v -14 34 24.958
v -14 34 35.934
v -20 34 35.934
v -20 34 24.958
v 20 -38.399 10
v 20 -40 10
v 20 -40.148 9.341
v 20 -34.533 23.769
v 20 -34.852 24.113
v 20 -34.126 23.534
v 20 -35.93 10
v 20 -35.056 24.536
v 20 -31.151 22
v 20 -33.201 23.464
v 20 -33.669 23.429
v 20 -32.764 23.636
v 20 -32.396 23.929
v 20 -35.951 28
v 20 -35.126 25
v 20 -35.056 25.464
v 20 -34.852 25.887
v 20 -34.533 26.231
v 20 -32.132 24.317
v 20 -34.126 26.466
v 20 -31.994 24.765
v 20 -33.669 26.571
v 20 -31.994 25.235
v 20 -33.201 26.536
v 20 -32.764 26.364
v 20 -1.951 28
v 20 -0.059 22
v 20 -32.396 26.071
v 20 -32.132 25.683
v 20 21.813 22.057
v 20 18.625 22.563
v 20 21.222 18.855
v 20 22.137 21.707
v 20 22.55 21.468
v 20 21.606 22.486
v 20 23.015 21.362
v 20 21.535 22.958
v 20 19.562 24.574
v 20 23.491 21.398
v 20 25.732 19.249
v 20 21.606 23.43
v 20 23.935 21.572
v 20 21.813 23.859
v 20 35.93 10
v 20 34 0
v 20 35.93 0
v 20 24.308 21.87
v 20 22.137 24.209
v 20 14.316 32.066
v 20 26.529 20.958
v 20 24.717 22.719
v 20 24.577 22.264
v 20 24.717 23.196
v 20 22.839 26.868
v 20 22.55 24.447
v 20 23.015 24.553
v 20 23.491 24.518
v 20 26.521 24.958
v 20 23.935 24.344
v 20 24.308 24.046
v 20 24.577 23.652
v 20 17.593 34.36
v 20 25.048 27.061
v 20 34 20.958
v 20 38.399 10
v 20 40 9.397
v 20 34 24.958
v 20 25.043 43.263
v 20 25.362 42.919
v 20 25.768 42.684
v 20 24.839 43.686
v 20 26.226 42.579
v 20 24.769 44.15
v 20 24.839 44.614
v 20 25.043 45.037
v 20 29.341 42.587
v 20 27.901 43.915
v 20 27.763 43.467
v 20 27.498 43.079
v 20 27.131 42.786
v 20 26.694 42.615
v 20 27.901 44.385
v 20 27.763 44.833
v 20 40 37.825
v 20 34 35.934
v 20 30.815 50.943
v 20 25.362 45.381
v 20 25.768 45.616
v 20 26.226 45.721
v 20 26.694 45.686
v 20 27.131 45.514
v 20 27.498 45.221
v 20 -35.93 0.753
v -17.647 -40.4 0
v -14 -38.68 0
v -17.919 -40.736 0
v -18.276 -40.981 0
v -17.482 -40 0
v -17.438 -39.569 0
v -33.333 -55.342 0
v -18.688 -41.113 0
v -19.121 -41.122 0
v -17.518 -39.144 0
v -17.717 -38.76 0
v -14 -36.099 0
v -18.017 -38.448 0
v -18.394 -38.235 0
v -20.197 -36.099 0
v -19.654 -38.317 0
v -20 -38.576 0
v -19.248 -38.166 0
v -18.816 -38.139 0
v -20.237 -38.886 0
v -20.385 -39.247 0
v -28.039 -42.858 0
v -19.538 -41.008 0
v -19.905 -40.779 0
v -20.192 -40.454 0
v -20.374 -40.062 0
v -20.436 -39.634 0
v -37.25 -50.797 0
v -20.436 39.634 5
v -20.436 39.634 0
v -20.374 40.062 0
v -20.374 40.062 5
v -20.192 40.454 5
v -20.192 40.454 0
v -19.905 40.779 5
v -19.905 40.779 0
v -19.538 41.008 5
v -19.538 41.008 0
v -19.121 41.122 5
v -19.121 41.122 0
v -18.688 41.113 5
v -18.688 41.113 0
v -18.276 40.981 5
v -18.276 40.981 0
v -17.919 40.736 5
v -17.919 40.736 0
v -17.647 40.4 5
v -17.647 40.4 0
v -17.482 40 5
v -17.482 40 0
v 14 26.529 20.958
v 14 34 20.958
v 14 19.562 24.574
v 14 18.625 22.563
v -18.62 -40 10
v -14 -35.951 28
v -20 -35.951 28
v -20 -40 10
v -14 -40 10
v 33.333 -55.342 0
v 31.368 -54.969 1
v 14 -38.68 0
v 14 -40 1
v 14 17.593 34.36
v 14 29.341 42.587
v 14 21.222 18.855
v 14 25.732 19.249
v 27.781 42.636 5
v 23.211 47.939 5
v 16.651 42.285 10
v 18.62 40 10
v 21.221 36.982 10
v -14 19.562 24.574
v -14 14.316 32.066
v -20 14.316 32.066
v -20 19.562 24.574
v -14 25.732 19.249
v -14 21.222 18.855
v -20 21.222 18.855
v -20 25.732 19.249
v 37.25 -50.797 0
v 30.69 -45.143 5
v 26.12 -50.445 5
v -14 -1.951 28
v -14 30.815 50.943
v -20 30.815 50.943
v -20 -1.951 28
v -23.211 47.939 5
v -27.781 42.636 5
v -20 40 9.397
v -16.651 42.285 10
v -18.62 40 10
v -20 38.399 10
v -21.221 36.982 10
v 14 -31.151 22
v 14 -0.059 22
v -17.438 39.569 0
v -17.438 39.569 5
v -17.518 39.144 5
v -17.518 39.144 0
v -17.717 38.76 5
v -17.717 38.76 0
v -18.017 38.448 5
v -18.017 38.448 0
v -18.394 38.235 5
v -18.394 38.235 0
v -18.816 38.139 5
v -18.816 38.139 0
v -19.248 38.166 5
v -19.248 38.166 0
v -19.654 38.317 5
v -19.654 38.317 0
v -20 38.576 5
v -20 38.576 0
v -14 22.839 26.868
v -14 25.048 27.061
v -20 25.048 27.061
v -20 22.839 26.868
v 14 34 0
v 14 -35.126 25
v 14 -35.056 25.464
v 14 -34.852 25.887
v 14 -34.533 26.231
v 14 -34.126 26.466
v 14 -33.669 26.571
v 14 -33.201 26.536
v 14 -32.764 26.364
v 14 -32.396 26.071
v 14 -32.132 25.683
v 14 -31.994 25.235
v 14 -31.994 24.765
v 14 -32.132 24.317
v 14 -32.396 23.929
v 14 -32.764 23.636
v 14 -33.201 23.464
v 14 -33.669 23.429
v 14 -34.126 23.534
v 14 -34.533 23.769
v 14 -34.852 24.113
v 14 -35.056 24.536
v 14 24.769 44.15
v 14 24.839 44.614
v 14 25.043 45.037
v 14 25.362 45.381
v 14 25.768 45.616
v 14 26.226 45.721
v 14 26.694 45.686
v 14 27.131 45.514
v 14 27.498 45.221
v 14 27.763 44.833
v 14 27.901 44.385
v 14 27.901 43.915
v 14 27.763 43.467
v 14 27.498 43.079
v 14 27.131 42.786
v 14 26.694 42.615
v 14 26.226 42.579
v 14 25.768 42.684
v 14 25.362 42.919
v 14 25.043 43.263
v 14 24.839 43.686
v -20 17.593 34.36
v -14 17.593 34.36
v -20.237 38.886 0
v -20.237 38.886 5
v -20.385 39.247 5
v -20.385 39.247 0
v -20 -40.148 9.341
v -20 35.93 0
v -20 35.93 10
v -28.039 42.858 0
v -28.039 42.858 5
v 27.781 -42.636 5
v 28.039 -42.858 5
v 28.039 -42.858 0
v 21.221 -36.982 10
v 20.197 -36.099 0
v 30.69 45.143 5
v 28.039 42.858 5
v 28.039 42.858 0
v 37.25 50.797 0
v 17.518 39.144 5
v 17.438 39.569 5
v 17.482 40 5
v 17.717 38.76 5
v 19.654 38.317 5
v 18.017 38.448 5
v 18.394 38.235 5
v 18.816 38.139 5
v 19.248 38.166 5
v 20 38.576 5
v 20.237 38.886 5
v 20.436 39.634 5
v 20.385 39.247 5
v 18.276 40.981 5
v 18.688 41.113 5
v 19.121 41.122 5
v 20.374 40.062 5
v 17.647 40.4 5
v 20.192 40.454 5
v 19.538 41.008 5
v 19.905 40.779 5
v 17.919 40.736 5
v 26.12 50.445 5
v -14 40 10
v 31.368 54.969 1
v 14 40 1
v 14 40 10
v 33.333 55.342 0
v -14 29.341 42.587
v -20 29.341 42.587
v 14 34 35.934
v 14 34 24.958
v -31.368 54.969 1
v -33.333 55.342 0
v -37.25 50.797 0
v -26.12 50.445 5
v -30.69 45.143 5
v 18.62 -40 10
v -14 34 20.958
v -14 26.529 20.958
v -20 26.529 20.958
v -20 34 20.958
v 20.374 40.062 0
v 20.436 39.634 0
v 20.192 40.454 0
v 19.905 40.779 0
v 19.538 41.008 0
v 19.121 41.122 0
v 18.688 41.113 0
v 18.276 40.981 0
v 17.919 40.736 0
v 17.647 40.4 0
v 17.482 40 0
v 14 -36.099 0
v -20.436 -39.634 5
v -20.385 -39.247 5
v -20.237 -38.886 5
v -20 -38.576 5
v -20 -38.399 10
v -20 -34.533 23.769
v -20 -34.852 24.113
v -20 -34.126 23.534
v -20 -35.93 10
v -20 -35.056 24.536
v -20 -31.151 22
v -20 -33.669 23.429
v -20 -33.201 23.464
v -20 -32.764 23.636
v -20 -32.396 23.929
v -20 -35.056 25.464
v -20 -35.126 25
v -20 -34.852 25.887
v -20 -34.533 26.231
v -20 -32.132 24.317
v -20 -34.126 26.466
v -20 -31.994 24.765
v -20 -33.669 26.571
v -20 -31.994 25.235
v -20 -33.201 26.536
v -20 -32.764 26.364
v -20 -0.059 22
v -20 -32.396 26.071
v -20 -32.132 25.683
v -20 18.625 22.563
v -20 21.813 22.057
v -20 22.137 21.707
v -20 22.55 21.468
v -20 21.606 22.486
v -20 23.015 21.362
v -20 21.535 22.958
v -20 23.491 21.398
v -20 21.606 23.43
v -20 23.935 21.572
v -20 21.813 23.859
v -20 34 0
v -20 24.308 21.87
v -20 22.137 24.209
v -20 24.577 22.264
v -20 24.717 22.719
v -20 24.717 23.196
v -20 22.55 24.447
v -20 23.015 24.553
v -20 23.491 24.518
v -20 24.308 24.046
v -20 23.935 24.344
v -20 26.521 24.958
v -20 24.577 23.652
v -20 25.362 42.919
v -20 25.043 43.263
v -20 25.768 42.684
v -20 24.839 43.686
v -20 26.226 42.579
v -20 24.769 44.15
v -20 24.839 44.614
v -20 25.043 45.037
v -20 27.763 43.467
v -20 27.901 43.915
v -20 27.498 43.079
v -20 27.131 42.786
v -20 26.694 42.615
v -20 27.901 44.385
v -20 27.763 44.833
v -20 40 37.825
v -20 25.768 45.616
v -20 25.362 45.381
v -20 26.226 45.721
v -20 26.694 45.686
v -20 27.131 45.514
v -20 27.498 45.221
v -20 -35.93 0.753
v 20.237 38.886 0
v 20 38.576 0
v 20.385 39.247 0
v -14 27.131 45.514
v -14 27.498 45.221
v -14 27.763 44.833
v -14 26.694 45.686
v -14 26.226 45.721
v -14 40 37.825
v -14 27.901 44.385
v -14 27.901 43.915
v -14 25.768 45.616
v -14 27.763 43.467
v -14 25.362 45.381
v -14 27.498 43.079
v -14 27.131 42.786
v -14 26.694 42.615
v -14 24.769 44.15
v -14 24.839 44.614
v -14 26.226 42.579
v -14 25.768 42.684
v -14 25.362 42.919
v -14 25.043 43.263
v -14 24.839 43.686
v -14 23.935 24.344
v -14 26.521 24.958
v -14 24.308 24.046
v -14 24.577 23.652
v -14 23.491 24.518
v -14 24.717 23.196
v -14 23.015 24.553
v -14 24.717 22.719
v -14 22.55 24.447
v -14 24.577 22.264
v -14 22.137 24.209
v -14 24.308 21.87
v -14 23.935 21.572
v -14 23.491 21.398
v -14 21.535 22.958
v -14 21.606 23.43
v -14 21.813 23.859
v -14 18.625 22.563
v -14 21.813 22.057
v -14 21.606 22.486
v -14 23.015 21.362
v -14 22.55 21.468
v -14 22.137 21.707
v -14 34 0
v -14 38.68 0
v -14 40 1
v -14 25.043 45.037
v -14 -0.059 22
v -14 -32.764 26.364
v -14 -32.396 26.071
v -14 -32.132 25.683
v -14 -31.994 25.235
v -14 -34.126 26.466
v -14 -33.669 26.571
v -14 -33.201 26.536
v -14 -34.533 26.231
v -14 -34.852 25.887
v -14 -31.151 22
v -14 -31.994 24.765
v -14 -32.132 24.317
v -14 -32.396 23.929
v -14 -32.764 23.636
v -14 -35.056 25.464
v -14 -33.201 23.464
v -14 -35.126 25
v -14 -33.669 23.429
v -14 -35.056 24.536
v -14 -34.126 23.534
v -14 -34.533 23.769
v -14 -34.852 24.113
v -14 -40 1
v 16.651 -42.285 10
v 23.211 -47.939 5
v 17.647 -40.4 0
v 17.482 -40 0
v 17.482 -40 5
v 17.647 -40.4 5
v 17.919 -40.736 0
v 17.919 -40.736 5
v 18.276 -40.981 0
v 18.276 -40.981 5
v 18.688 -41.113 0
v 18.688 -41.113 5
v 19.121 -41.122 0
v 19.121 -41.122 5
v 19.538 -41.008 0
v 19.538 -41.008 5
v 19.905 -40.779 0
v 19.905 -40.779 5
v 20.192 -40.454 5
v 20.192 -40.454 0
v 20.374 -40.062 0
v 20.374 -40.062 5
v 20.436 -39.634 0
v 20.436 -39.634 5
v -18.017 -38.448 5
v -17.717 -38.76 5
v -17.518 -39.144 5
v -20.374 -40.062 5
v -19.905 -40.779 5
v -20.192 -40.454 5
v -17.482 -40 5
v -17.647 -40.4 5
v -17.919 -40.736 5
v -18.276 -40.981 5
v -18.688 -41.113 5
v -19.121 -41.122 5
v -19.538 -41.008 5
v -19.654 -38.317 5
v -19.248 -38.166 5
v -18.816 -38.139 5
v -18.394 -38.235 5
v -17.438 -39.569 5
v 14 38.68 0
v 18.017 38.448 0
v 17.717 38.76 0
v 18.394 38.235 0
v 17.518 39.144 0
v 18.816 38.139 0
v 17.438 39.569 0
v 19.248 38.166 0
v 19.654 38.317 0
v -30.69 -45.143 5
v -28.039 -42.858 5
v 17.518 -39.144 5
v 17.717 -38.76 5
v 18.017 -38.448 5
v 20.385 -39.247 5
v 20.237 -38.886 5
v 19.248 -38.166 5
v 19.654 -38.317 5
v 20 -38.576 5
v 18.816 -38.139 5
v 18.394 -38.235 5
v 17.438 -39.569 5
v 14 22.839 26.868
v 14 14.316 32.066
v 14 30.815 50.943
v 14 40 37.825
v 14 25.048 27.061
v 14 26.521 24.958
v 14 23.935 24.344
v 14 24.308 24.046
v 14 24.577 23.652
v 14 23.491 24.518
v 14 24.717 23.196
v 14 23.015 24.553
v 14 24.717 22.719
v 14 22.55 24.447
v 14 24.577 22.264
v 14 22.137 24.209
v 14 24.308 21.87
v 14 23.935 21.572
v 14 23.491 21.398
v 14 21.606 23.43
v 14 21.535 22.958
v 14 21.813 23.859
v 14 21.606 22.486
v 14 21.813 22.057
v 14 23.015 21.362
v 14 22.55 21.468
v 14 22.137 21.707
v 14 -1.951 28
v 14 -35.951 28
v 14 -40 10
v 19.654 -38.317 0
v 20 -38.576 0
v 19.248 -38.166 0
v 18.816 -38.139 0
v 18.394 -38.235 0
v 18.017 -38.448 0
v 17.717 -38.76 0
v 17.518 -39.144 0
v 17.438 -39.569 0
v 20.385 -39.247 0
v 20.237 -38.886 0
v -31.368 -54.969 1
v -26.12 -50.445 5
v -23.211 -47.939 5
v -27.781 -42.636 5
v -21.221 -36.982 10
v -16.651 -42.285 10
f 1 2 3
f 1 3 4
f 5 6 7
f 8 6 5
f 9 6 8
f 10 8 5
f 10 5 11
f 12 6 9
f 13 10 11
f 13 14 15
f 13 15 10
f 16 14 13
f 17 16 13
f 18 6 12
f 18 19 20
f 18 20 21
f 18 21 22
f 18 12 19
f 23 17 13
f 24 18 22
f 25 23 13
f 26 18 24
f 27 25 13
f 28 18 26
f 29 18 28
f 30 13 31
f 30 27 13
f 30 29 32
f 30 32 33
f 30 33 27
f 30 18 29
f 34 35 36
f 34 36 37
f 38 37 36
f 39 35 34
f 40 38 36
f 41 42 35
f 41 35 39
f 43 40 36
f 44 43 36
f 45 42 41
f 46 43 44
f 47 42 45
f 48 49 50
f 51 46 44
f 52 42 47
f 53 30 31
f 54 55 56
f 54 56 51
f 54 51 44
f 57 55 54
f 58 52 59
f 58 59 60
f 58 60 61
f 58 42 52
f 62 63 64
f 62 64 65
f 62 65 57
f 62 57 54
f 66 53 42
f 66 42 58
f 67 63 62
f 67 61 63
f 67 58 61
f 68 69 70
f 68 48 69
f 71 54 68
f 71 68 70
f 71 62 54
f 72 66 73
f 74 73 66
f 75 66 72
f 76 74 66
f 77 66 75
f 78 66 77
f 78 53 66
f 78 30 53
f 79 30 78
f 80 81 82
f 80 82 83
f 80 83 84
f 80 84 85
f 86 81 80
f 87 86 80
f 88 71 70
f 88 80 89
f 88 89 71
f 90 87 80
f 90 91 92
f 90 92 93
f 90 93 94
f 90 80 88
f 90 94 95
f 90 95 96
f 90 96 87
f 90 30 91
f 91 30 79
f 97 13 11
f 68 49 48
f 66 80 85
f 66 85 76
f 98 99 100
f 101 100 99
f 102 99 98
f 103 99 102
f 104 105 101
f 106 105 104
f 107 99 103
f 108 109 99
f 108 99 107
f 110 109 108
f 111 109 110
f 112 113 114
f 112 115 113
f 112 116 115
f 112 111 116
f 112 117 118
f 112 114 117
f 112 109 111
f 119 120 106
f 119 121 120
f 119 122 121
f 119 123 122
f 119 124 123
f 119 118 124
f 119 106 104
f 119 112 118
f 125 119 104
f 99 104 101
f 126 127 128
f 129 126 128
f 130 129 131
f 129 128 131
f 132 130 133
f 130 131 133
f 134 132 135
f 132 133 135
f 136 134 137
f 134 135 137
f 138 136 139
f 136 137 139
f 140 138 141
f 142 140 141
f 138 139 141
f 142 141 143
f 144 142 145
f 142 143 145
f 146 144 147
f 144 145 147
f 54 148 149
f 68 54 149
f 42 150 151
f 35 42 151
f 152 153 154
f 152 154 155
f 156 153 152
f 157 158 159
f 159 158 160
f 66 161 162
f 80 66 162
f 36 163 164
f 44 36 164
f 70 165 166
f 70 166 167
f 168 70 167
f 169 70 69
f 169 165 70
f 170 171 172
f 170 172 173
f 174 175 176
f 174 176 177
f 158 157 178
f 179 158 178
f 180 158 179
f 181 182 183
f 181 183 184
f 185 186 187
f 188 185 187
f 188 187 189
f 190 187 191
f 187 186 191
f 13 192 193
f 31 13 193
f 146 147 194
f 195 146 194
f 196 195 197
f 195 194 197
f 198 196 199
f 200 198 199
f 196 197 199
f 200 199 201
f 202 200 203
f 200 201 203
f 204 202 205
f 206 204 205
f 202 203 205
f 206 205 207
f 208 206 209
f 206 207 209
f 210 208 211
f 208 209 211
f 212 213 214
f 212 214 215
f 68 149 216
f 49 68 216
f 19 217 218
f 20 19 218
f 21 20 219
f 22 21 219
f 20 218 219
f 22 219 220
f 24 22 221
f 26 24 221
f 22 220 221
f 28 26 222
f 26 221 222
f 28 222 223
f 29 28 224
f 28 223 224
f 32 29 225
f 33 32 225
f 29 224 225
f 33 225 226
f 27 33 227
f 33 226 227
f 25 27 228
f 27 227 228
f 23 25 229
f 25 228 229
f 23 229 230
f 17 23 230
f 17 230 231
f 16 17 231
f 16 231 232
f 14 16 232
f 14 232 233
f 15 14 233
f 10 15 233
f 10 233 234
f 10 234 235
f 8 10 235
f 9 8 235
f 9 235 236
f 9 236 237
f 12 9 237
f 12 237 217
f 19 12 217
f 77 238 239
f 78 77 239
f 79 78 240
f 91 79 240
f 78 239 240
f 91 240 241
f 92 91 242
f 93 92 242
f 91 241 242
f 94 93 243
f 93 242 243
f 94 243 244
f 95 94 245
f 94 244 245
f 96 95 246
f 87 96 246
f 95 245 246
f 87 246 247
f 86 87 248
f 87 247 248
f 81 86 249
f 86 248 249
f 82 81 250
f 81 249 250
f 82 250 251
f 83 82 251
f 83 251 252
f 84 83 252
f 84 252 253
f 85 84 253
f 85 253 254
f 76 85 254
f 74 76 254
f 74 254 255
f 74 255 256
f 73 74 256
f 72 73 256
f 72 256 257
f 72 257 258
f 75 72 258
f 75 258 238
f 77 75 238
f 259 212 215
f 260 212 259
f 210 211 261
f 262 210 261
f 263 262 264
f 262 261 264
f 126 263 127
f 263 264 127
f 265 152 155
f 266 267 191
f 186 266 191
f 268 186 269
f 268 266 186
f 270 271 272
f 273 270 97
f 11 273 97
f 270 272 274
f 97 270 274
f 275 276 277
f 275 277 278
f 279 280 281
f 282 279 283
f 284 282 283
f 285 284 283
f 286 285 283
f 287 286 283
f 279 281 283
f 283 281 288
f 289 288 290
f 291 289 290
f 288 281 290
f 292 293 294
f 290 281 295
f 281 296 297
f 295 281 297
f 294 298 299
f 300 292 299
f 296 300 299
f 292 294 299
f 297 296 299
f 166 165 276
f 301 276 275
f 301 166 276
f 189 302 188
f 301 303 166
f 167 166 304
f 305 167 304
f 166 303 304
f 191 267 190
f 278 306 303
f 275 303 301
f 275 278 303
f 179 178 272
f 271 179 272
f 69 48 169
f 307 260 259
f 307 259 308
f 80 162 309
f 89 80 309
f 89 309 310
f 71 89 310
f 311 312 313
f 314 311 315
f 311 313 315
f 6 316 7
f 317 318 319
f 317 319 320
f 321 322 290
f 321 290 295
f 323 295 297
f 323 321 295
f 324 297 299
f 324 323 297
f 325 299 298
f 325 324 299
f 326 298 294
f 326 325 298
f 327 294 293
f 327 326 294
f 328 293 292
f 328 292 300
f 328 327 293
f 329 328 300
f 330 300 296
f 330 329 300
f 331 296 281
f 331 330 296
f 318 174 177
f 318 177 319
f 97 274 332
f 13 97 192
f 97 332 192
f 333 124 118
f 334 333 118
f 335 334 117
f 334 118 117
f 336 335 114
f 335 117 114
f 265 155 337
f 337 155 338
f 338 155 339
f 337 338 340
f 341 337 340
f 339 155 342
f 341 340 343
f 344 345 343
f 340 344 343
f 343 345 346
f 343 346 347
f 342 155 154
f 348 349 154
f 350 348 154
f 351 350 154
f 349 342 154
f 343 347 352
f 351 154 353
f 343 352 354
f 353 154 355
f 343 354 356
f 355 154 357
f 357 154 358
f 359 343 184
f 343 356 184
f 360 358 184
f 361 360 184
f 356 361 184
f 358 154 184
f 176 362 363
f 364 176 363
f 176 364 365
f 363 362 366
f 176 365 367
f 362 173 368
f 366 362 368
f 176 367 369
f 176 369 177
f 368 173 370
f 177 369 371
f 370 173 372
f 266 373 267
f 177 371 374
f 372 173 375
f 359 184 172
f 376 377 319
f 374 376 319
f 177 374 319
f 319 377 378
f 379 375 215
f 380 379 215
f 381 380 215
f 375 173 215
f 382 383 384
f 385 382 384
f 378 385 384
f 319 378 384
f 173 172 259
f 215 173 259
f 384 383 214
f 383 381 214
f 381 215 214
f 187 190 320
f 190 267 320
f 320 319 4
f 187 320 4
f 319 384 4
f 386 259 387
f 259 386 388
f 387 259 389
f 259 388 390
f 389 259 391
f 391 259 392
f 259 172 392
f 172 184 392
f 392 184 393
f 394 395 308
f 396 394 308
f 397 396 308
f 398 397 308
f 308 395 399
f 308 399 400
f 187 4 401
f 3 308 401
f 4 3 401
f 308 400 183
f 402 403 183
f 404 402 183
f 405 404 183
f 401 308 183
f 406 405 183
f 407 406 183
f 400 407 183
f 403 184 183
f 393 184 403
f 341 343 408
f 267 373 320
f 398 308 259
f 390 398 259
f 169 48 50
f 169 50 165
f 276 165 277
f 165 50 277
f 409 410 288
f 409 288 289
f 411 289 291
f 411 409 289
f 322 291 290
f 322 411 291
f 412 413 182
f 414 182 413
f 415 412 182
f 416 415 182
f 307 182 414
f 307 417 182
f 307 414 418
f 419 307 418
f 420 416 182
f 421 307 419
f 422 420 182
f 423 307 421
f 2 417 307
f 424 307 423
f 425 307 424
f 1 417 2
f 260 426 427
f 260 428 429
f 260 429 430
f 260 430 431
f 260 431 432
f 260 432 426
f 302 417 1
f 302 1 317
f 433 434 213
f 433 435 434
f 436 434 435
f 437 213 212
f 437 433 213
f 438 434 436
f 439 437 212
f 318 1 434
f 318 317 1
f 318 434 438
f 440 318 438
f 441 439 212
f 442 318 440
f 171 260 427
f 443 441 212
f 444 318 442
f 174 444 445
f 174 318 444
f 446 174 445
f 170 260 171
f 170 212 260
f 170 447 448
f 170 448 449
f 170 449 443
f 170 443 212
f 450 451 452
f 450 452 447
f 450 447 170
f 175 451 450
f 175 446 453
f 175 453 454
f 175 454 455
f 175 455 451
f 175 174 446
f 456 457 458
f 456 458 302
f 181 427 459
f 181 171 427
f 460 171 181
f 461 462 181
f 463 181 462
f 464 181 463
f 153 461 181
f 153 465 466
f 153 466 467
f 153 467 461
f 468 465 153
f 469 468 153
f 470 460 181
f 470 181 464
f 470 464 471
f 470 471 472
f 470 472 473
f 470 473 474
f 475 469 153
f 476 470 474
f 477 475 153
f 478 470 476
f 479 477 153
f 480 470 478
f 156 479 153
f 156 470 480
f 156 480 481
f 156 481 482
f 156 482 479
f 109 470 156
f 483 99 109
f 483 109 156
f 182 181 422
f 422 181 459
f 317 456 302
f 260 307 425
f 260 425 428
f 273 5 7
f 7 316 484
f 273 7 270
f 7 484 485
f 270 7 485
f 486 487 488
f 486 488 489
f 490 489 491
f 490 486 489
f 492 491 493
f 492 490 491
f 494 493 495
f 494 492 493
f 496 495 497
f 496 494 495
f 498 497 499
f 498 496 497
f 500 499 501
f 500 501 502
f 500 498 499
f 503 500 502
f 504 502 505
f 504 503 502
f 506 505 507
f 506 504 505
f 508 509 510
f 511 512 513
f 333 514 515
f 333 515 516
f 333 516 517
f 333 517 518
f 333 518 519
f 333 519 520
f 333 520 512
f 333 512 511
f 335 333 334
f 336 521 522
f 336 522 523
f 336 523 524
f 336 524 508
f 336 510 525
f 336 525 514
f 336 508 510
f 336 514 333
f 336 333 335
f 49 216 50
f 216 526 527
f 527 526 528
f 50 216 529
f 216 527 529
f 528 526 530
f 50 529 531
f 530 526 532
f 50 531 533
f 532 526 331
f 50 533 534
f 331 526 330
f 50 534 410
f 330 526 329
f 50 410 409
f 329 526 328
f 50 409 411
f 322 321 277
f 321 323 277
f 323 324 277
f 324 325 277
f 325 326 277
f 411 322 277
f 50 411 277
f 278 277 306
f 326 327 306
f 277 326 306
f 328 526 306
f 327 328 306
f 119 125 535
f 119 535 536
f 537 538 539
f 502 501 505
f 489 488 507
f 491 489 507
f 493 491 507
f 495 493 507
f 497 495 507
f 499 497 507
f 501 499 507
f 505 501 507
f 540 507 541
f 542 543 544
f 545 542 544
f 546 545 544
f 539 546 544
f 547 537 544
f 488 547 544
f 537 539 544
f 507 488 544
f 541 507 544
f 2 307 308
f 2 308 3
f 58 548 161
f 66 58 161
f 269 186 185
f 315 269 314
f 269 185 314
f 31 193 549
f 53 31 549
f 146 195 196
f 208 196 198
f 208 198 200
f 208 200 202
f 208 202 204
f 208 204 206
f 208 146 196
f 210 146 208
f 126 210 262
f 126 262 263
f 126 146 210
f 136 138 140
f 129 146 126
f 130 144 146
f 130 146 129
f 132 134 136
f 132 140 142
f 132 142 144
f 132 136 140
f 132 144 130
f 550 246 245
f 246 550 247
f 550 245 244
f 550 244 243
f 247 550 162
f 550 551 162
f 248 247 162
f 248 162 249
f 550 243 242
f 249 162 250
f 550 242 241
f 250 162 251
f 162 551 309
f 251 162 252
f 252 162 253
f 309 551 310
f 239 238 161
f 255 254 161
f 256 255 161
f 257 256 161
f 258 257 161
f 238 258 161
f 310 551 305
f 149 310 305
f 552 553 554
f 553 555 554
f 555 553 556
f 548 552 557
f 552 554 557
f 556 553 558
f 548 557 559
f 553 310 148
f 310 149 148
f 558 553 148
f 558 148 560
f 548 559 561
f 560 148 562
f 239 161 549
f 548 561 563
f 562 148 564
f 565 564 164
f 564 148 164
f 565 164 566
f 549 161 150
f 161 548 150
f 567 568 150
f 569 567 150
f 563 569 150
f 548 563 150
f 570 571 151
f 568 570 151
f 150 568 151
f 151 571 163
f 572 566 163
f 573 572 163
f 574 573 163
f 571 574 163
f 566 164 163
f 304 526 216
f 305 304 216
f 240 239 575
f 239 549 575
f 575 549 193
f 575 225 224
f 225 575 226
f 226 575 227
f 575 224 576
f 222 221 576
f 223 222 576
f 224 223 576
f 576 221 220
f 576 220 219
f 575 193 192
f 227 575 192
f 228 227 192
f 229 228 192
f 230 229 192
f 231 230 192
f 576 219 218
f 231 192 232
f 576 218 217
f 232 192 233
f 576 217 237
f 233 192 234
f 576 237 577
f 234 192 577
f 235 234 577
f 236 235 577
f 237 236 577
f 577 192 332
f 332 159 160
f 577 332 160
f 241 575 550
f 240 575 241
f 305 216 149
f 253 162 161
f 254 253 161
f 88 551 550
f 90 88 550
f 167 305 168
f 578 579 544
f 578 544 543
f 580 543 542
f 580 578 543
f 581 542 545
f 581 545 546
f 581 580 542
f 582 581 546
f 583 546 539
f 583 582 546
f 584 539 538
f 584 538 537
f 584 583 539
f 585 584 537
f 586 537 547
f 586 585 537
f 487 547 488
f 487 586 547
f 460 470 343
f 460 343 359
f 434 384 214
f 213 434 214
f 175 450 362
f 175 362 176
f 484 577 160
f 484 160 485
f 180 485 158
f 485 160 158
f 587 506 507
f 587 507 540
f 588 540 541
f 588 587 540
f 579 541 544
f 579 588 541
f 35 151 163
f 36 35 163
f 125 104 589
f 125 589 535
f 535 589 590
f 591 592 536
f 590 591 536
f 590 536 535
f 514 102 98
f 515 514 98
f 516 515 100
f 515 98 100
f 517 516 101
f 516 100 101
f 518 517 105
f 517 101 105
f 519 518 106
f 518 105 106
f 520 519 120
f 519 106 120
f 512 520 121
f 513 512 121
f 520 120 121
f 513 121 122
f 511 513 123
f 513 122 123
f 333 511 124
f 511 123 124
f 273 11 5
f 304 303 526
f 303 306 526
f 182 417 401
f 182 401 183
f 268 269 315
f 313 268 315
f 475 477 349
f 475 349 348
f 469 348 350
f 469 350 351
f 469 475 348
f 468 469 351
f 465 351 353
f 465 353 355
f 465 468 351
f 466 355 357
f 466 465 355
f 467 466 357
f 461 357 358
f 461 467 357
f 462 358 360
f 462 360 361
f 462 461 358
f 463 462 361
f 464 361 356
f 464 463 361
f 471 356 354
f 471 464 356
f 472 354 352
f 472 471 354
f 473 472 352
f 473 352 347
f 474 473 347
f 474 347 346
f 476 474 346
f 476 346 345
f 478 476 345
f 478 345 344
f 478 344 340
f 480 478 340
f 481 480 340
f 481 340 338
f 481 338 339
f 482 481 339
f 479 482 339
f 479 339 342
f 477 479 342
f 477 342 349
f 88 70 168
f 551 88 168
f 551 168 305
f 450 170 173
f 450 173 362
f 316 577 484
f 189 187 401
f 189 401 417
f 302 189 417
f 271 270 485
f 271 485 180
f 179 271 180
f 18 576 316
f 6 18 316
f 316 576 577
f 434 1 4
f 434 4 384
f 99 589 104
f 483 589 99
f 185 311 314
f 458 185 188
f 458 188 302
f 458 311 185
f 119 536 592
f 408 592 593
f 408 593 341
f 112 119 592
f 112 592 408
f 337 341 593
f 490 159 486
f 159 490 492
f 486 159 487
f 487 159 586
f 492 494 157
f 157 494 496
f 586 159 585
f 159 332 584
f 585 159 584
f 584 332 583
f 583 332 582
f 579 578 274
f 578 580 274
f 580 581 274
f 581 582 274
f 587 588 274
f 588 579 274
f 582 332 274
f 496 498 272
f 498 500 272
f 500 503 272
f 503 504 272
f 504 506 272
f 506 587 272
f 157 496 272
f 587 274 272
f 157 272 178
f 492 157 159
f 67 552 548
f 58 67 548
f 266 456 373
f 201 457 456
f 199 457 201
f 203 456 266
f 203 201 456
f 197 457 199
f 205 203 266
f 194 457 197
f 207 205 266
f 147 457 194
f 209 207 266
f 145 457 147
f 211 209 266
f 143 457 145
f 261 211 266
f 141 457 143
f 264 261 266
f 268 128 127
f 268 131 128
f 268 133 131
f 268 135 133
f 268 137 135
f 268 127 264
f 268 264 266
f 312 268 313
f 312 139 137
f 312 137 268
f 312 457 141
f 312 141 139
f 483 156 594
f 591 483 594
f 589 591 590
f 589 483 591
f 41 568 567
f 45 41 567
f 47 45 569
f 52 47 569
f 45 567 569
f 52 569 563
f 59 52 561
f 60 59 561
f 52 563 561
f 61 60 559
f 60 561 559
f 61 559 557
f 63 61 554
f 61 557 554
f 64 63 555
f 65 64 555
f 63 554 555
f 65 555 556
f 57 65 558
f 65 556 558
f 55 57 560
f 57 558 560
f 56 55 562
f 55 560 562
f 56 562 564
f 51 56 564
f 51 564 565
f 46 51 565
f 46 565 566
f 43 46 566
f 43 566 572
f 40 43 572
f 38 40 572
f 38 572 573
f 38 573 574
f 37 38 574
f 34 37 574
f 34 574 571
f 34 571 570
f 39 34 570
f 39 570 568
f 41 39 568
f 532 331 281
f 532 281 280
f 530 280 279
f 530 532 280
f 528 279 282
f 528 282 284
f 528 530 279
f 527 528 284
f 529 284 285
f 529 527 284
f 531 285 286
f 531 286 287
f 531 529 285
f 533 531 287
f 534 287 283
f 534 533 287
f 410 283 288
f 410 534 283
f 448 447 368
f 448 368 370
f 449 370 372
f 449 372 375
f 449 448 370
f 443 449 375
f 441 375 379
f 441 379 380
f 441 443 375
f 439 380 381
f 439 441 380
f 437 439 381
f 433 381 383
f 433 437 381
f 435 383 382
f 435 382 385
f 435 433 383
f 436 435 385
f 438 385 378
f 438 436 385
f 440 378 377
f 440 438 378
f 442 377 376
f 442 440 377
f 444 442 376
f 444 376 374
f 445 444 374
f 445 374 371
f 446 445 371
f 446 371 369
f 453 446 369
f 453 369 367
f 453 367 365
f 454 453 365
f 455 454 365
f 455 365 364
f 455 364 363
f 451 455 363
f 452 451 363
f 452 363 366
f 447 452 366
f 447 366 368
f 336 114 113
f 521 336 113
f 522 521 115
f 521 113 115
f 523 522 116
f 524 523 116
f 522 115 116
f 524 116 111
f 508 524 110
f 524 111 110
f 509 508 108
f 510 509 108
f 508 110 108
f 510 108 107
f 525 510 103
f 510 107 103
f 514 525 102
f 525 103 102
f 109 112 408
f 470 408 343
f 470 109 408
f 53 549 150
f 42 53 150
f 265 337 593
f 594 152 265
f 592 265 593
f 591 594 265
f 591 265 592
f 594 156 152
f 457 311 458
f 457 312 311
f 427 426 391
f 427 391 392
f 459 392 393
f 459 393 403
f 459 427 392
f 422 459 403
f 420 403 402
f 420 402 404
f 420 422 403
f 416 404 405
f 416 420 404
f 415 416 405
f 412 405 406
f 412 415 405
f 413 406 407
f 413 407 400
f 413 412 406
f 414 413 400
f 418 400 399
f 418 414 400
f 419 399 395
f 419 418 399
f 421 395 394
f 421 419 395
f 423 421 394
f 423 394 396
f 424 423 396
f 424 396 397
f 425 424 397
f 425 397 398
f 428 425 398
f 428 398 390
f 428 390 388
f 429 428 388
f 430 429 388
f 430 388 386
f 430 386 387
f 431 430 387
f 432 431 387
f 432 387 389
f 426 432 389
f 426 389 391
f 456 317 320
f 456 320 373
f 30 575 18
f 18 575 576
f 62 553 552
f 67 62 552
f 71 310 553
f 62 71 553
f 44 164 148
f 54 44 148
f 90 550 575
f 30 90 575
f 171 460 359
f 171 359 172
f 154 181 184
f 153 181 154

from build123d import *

# Parameters (mm, degrees)
F1_DEPTH     = 70
F2_DEPTH     = 10
F3_DEPTH     = 5
F4_R         = 1.6
F4_R_2       = 1.575
F5_DEPTH     = 25
F6_DEPTH     = 5
F7_SIZE      = 1
F8_T1_DEPTH  = 53.5675435836
F8_T6_DEPTH  = 53.5675435836
F8_T13_DEPTH = 53.5675435836
F8_T19_DEPTH = 53.5675435836
F8_T26_DEPTH = 53.5675435836
F8_T33_DEPTH = 53.5675435836
F9_T1_DEPTH  = 53.5675435836
F9_T6_DEPTH  = 53.5675435836
F9_T12_DEPTH = 53.5675435836
F9_T19_DEPTH = 53.5675435836
F9_T26_DEPTH = 53.5675435836
F9_T32_DEPTH = 53.5675435836


# Not quite as in the source:
# - a fillet or chamfer that OpenCascade refuses, or shapes differently, is made with other operations: its cross-section is extruded or revolved along the edge and cut away or added


with BuildPart() as f1:
    # F0 (on Top) → F1 (new body)
    with BuildSketch(Plane.XY):
        with BuildLine():
            Line((17.481584177, 40), (14, 40))
            Line((14, 40), (18.5698965916, 34.6975434805))
            Line((18.5698965916, 34.6975434805), (20, 35.9300712093))
            Line((20, 35.9300712093), (20, 38.5762325992))
            ThreePointArc((20, 38.5762325992), (18.1979669018, 38.327945742), (17.481584177, 40))
        make_face()
        with BuildLine():
            Line((20, 40), (17.481584177, 40))
            ThreePointArc((17.481584177, 40), (18.1979669018, 38.327945742), (20, 38.5762325992))
            Line((20, 38.5762325992), (20, 40))
        make_face()
        Polygon((18.5698965916, 34.6975434805), (14, 40), (14, 0), (14, -40), (18.5698965916, -34.6975434805), (20, -35.9300712093), (20, 0), (20, 35.9300712093), align=None)
        with BuildLine():
            Line((18.5698965916, -34.6975434805), (14, -40))
            Line((14, -40), (17.481584177, -40))
            ThreePointArc((17.481584177, -40), (18.1979669018, -38.327945742), (20, -38.5762325992))
            Line((20, -38.5762325992), (20, -35.9300712093))
            Line((20, -35.9300712093), (18.5698965916, -34.6975434805))
        make_face()
        with BuildLine():
            ThreePointArc((20, -38.5762325992), (18.1979669018, -38.327945742), (17.481584177, -40))
            Line((17.481584177, -40), (20, -40))
            Line((20, -40), (20, -38.5762325992))
        make_face()
    extrude(amount=F1_DEPTH)

    # F0 (on Top) → F2 (join)
    with BuildSketch(Plane.XY):
        with BuildLine():
            ThreePointArc((20.4361765556, 39.633720036), (19.1207184642, 41.1223248473), (17.481584177, 40))
            Line((17.481584177, 40), (20, 40))
            Line((20, 40), (20, 38.5762325992))
            ThreePointArc((20, 38.5762325992), (20.3228515656, 39.0617651281), (20.4361765556, 39.633720036))
        make_face()
        with BuildLine():
            Line((23.4686723563, 48.1605296279), (14, 40))
            Line((14, 40), (17.481584177, 40))
            ThreePointArc((17.481584177, 40), (19.1207184642, 41.1223248473), (20.4361765556, 39.633720036))
            ThreePointArc((20.4361765556, 39.633720036), (20.3228515656, 39.0617651281), (20, 38.5762325992))
            Line((20, 38.5762325992), (20, 35.9300712093))
            Line((20, 35.9300712093), (28.038568948, 42.8580731084))
            Line((28.038568948, 42.8580731084), (23.4686723563, 48.1605296279))
        make_face()
        with BuildLine():
            Line((17.481584177, -40), (14, -40))
            Line((14, -40), (23.4686723563, -48.1605296279))
            Line((23.4686723563, -48.1605296279), (28.038568948, -42.8580731084))
            Line((28.038568948, -42.8580731084), (20, -35.9300712093))
            Line((20, -35.9300712093), (20, -38.5762325992))
            ThreePointArc((20, -38.5762325992), (20.3228515656, -39.0617651281), (20.4361765556, -39.633720036))
            ThreePointArc((20.4361765556, -39.633720036), (19.1207184642, -41.1223248473), (17.481584177, -40))
        make_face()
        with BuildLine():
            Line((20, -40), (17.481584177, -40))
            ThreePointArc((17.481584177, -40), (19.1207184642, -41.1223248473), (20.4361765556, -39.633720036))
            ThreePointArc((20.4361765556, -39.633720036), (20.3228515656, -39.0617651281), (20, -38.5762325992))
            Line((20, -38.5762325992), (20, -40))
        make_face()
    extrude(amount=F2_DEPTH)

    # F0 (on Top) → F3 (join)
    with BuildSketch(Plane.XY):
        Polygon((32.9373447127, 56.3210592559), (23.4686723563, 48.1605296279), (28.038568948, 42.8580731084), (37.5072413043, 51.0186027363), align=None)
        Polygon((28.038568948, -42.8580731084), (23.4686723563, -48.1605296279), (32.9373447127, -56.3210592559), (37.5072413043, -51.0186027363), align=None)
    extrude(amount=F3_DEPTH)

    # F4 (on face) → F5 (cut)
    with BuildSketch(Plane(origin=(14, 0, 0), x_dir=(0, -1, 0), z_dir=(-1, 0, 0))):
        Polygon((-34, 0), (36.0994255375, 0), (31.1508810268, 22), (0.0593981216, 22), (-14.3160304975, 32.0657834841), (-19.5621121893, 24.5736023727), (-18.6246911161, 22.5632963938), (-21.2215746664, 18.8545623277), (-25.7318743586, 19.2491624199), (-26.5286701393, 20.9578964859), (-34, 20.9578964859), align=None)
        Polygon((-30.8148909167, 50.943057454), (1.9511908549, 28), (35.9511908549, 28), (40, 10), (40, 70), (-40, 70), (-40, 37.825362225), align=None)
        Polygon((-34, 24.9578964859), (-26.5211773832, 24.9578964859), (-25.0484069503, 27.0612306442), (-22.8387203665, 26.8679081181), (-17.5926386747, 34.3600892295), (-29.3414372691, 42.5866865702), (-34, 35.9335694917), align=None)
        with Locations((-23.1349908083, 22.9578964859)):
            Circle(F4_R)
        with Locations((-26.3438594686, 44.1500837642)):
            Circle(F4_R_2)
        with Locations((33.5510359408, 25)):
            Circle(F4_R_2)
    extrude(amount=-F5_DEPTH, mode=Mode.SUBTRACT)

    # F0 (on Top) → F6 (cut)
    with BuildSketch(Plane.XY):
        with BuildLine():
            Line((20, -40), (17.481584177, -40))
            ThreePointArc((17.481584177, -40), (19.1207184642, -41.1223248473), (20.4361765556, -39.633720036))
            ThreePointArc((20.4361765556, -39.633720036), (20.3228515656, -39.0617651281), (20, -38.5762325992))
            Line((20, -38.5762325992), (20, -40))
        make_face()
        with BuildLine():
            ThreePointArc((20, -38.5762325992), (18.1979669018, -38.327945742), (17.481584177, -40))
            Line((17.481584177, -40), (20, -40))
            Line((20, -40), (20, -38.5762325992))
        make_face()
        with BuildLine():
            ThreePointArc((20.4361765556, 39.633720036), (19.1207184642, 41.1223248473), (17.481584177, 40))
            Line((17.481584177, 40), (20, 40))
            Line((20, 40), (20, 38.5762325992))
            ThreePointArc((20, 38.5762325992), (20.3228515656, 39.0617651281), (20.4361765556, 39.633720036))
        make_face()
        with BuildLine():
            Line((20, 40), (17.481584177, 40))
            ThreePointArc((17.481584177, 40), (18.1979669018, 38.327945742), (20, 38.5762325992))
            Line((20, 38.5762325992), (20, 40))
        make_face()
    extrude(amount=F6_DEPTH, mode=Mode.SUBTRACT)

    # F7
    f7_edges = [f1.edges().sort_by_distance(p)[0] for p in [
        (23.468672, -48.16053, 0),
        (23.468672, 48.16053, 0),
    ]]
    chamfer(f7_edges, length=F7_SIZE)

    # F8: chamfer of 9 x 5.1961524227 on 2 edges, made by hand

    # F8_s2 → F8_t1 (cut)
    with BuildSketch(Plane(origin=(-29.0147501324, -33.6658495258, 0), x_dir=(0, 0, 1), z_dir=(0.6528423702, 0.7574937885, 0))):
        Polygon((-0.1961524227, 61.7186078485), (5, 52.7186078485), (5, 61.7186078485), align=None)
    extrude(amount=F8_T1_DEPTH, mode=Mode.SUBTRACT)


with BuildPart() as f8_tool4:
    # F8_s5 → F8_t6 (new body)
    with BuildSketch(Plane(origin=(-29.0147501324, -33.6658495258, 0), x_dir=(0, 0, 1), z_dir=(0.6528423702, 0.7574937885, 0))):
        Polygon((10, 40.2186078485), (4.8038475773, 49.2186078485), (10, 49.2186078485), align=None)
    extrude(amount=F8_T6_DEPTH)

    split(bisect_by=Plane(origin=(0, -40.2146679203, 9.0456397358), x_dir=(1, 0, 0), z_dir=(0, -0.9756235772, 0.219450759)), keep=Keep.TOP)

    split(bisect_by=Plane.YZ.offset(20), keep=Keep.BOTTOM)

    split(bisect_by=Plane.XY.offset(5), keep=Keep.TOP)


with BuildPart() as f1_1:
    add(f1.part)

    # F8_t3: cut F8_tool4
    add(f8_tool4.part, mode=Mode.SUBTRACT)


with BuildPart() as f8_tool11:
    # F8_s12 → F8_t13 (new body)
    with BuildSketch(Plane(origin=(-29.0147501324, -33.6658495258, 0), x_dir=(0, 0, 1), z_dir=(0.6528423702, 0.7574937885, 0))):
        Polygon((10, 40.2186078485), (4.8038475773, 49.2186078485), (10, 49.2186078485), align=None)
    extrude(amount=F8_T13_DEPTH)

    split(bisect_by=Plane.YZ.offset(20), keep=Keep.BOTTOM)

    split(bisect_by=Plane.XY.offset(5), keep=Keep.BOTTOM)


with BuildPart() as f1_2:
    add(f1_1.part)

    # F8_t10: cut F8_tool11
    add(f8_tool11.part, mode=Mode.SUBTRACT)


with BuildPart() as f8_tool17:
    # F8_s18 → F8_t19 (new body)
    with BuildSketch(Plane(origin=(-29.0147501324, -33.6658495258, 0), x_dir=(0, 0, 1), z_dir=(0.6528423702, 0.7574937885, 0))):
        Polygon((10, 40.2186078485), (4.8038475773, 49.2186078485), (10, 49.2186078485), align=None)
    extrude(amount=F8_T19_DEPTH)

    split(bisect_by=Plane(origin=(0, -40.2146679203, 9.0456397358), x_dir=(1, 0, 0), z_dir=(0, -0.9756235772, 0.219450759)), keep=Keep.TOP)

    split(bisect_by=Plane.YZ.offset(20), keep=Keep.TOP)

    split(bisect_by=Plane.XY.offset(5), keep=Keep.TOP)


with BuildPart() as f1_3:
    add(f1_2.part)

    # F8_t16: cut F8_tool17
    add(f8_tool17.part, mode=Mode.SUBTRACT)


with BuildPart() as f8_tool24:
    # F8_s25 → F8_t26 (new body)
    with BuildSketch(Plane(origin=(-29.0147501324, -33.6658495258, 0), x_dir=(0, 0, 1), z_dir=(0.6528423702, 0.7574937885, 0))):
        Polygon((10, 40.2186078485), (4.8038475773, 49.2186078485), (10, 49.2186078485), align=None)
    extrude(amount=F8_T26_DEPTH)

    split(bisect_by=Plane(origin=(0, -40.2146679203, 9.0456397358), x_dir=(1, 0, 0), z_dir=(0, 0.9756235772, -0.219450759)), keep=Keep.TOP)

    split(bisect_by=Plane.YZ.offset(20), keep=Keep.TOP)

    split(bisect_by=Plane.XY.offset(5), keep=Keep.TOP)


with BuildPart() as f1_4:
    add(f1_3.part)

    # F8_t23: cut F8_tool24
    add(f8_tool24.part, mode=Mode.SUBTRACT)


with BuildPart() as f8_tool31:
    # F8_s32 → F8_t33 (new body)
    with BuildSketch(Plane(origin=(-29.0147501324, -33.6658495258, 0), x_dir=(0, 0, 1), z_dir=(0.6528423702, 0.7574937885, 0))):
        Polygon((10, 40.2186078485), (4.8038475773, 49.2186078485), (10, 49.2186078485), align=None)
    extrude(amount=F8_T33_DEPTH)

    split(bisect_by=Plane(origin=(0, -40.2146679203, 9.0456397358), x_dir=(1, 0, 0), z_dir=(0, 0.9756235772, -0.219450759)), keep=Keep.TOP)

    split(bisect_by=Plane.XY.offset(5), keep=Keep.BOTTOM)


with BuildPart() as f1_5:
    add(f1_4.part)

    # F8_t30: cut F8_tool31
    add(f8_tool31.part, mode=Mode.SUBTRACT)

    # F9: chamfer of 9 x 5.1961524227 on 2 edges, made by hand

    # F9_s2 → F9_t1 (cut)
    with BuildSketch(Plane(origin=(5.9564119884, -6.9112320044, 0), x_dir=(0, 0, 1), z_dir=(-0.6528423702, 0.7574937885, 0))):
        Polygon((-0.1961524227, 61.7186078485), (5, 52.7186078485), (5, 61.7186078485), align=None)
    extrude(amount=F9_T1_DEPTH, mode=Mode.SUBTRACT)


with BuildPart() as f9_tool4:
    # F9_s5 → F9_t6 (new body)
    with BuildSketch(Plane(origin=(5.9564119884, -6.9112320044, 0), x_dir=(0, 0, 1), z_dir=(-0.6528423702, 0.7574937885, 0))):
        Polygon((4.8038475773, 49.2186078485), (10, 40.2186078485), (10, 49.2186078485), align=None)
    extrude(amount=F9_T6_DEPTH)

    split(bisect_by=Plane.XY.offset(5), keep=Keep.BOTTOM)

    split(bisect_by=Plane.XZ.offset(-40), keep=Keep.TOP)


with BuildPart() as f1_6:
    add(f1_5.part)

    # F9_t3: cut F9_tool4
    add(f9_tool4.part, mode=Mode.SUBTRACT)


with BuildPart() as f9_tool10:
    # F9_s11 → F9_t12 (new body)
    with BuildSketch(Plane(origin=(5.9564119884, -6.9112320044, 0), x_dir=(0, 0, 1), z_dir=(-0.6528423702, 0.7574937885, 0))):
        Polygon((4.8038475773, 49.2186078485), (10, 40.2186078485), (10, 49.2186078485), align=None)
    extrude(amount=F9_T12_DEPTH)

    split(bisect_by=Plane.YZ.offset(20), keep=Keep.TOP)

    split(bisect_by=Plane.XY.offset(5), keep=Keep.TOP)

    split(bisect_by=Plane.XZ.offset(-40), keep=Keep.TOP)


with BuildPart() as f1_7:
    add(f1_6.part)

    # F9_t9: cut F9_tool10
    add(f9_tool10.part, mode=Mode.SUBTRACT)


with BuildPart() as f9_tool17:
    # F9_s18 → F9_t19 (new body)
    with BuildSketch(Plane(origin=(5.9564119884, -6.9112320044, 0), x_dir=(0, 0, 1), z_dir=(-0.6528423702, 0.7574937885, 0))):
        Polygon((4.8038475773, 49.2186078485), (10, 40.2186078485), (10, 49.2186078485), align=None)
    extrude(amount=F9_T19_DEPTH)

    split(bisect_by=Plane.YZ.offset(20), keep=Keep.TOP)

    split(bisect_by=Plane.XY.offset(5), keep=Keep.TOP)

    split(bisect_by=Plane.XZ.offset(-40), keep=Keep.BOTTOM)


with BuildPart() as f1_8:
    add(f1_7.part)

    # F9_t16: cut F9_tool17
    add(f9_tool17.part, mode=Mode.SUBTRACT)


with BuildPart() as f9_tool24:
    # F9_s25 → F9_t26 (new body)
    with BuildSketch(Plane(origin=(5.9564119884, -6.9112320044, 0), x_dir=(0, 0, 1), z_dir=(-0.6528423702, 0.7574937885, 0))):
        Polygon((4.8038475773, 49.2186078485), (10, 40.2186078485), (10, 49.2186078485), align=None)
    extrude(amount=F9_T26_DEPTH)

    split(bisect_by=Plane.YZ.offset(20), keep=Keep.BOTTOM)

    split(bisect_by=Plane.XY.offset(5), keep=Keep.BOTTOM)


with BuildPart() as f1_9:
    add(f1_8.part)

    # F9_t23: cut F9_tool24
    add(f9_tool24.part, mode=Mode.SUBTRACT)


with BuildPart() as f9_tool30:
    # F9_s31 → F9_t32 (new body)
    with BuildSketch(Plane(origin=(5.9564119884, -6.9112320044, 0), x_dir=(0, 0, 1), z_dir=(-0.6528423702, 0.7574937885, 0))):
        Polygon((4.8038475773, 49.2186078485), (10, 40.2186078485), (10, 49.2186078485), align=None)
    extrude(amount=F9_T32_DEPTH)

    split(bisect_by=Plane.YZ.offset(20), keep=Keep.BOTTOM)

    split(bisect_by=Plane.XY.offset(5), keep=Keep.TOP)

    split(bisect_by=Plane.XZ.offset(-40), keep=Keep.BOTTOM)


with BuildPart() as f1_10:
    add(f1_9.part)

    # F9_t29: cut F9_tool30
    add(f9_tool30.part, mode=Mode.SUBTRACT)


with BuildPart() as f10_1:
    # F10: instance of F1
    add(f1_10.part.mirror(Plane.YZ))


solid = Compound([f1_10.part, f10_1.part])
